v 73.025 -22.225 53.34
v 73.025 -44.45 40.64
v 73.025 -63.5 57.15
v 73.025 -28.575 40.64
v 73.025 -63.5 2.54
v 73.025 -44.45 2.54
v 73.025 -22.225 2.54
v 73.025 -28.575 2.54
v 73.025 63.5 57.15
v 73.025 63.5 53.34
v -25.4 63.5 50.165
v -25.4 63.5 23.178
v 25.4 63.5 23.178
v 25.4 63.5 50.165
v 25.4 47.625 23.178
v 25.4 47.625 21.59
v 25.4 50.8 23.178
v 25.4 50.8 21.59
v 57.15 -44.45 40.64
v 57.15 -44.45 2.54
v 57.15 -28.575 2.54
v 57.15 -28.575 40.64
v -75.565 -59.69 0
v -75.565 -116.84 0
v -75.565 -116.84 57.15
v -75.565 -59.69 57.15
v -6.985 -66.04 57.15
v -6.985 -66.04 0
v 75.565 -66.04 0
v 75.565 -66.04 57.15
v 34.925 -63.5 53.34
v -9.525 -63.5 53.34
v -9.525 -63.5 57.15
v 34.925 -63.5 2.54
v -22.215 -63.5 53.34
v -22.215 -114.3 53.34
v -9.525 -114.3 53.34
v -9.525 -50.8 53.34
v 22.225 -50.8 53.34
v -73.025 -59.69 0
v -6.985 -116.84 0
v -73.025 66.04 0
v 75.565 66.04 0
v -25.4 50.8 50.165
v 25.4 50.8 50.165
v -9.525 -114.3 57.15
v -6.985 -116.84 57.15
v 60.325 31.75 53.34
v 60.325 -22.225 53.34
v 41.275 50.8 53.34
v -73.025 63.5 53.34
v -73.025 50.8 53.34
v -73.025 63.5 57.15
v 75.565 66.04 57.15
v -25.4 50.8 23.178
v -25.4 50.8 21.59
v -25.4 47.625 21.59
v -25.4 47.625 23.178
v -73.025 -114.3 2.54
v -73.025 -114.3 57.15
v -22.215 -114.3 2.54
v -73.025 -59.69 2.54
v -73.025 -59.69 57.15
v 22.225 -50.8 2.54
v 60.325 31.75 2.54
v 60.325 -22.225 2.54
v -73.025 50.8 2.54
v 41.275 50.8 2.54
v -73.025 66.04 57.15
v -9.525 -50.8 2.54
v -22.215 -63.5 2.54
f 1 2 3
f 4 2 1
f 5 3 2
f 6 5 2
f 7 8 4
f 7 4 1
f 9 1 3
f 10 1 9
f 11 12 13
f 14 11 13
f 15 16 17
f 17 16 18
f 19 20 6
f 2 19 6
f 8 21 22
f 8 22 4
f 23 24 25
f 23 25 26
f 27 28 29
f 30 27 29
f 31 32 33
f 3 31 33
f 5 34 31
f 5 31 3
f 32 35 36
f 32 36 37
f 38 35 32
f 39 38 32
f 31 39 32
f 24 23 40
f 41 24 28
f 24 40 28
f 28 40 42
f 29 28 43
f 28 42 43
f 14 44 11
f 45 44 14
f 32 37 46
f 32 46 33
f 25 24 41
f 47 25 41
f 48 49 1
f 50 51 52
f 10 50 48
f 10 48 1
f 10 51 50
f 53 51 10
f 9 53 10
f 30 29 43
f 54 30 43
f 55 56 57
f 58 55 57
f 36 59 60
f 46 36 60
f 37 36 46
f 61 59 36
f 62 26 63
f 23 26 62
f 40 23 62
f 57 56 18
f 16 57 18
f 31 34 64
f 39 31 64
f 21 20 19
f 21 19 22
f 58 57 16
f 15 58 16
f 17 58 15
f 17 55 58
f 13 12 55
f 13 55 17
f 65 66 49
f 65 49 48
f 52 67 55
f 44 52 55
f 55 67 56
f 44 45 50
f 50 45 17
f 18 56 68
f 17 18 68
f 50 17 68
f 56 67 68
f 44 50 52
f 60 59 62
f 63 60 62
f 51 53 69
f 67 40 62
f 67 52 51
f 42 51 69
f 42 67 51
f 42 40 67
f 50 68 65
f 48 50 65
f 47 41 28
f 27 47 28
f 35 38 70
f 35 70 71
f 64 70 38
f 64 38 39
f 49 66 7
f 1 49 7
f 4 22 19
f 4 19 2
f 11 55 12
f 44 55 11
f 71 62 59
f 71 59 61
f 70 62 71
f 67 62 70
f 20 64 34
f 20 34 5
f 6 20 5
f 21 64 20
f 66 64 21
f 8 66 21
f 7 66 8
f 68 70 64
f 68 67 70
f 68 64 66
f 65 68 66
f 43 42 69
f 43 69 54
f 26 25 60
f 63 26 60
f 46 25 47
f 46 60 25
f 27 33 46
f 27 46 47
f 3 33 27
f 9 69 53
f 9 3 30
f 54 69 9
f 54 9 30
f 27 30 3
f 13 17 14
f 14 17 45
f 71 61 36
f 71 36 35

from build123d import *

# Parameters (mm, degrees)
F0_W      = 146.05
F0_H      = 127
F1_DEPTH  = 2.54
F2_W      = 146.05
F2_H      = 12.7
F3_DEPTH  = 50.8
F5_W      = 50.8
F5_H      = 28.575
F6_DEPTH  = 12.7
F7_W      = 50.8
F7_H      = 3.175
F7_H_2    = 12.7
F8_DEPTH  = 1.5875
F9_W      = 63.5
F9_H      = 50.8
F10_DEPTH = 2.54
F11_W     = 12.7
F11_H     = 73.025
F12_DEPTH = 50.8
F13_W     = 148.59
F13_H     = 2.54
F15_DEPTH = 57.15
F14_W     = 2.54
F14_H     = 127
F16_DEPTH = 57.15
F18_DEPTH = 50.8
F19_W     = 31.75
F19_H     = 12.7
F20_DEPTH = 50.8
F22_DEPTH = 50.8
F24_DEPTH = 50.8
F25_W     = 12.68959
F25_H     = 50.8
F26_DEPTH = 50.8
F4_W      = 15.875
F4_H      = 15.875
F27_DEPTH = 38.1
F28_W     = 85.09
F28_H     = 2.54
F29_DEPTH = 57.15
F30_W     = 2.54
F30_H     = 50.8
F32_DEPTH = 57.15
F31_W     = 63.5
F31_H     = 2.54
F33_DEPTH = 57.15
F34_W     = 2.54
F34_H     = 57.15
F35_DEPTH = 57.15


with BuildPart() as f1:
    # F0 (on Top) → F1 (new body)
    with BuildSketch(Plane.XY):
        Rectangle(F0_W, F0_H)
    extrude(amount=F1_DEPTH)

    # F2 (on face) → F3 (join)
    with BuildSketch(Plane.XY.offset(2.54)):
        with Locations((0, 57.15)):
            Rectangle(F2_W, F2_H)
    extrude(amount=F3_DEPTH)

    # F5 (on face) → F6 (cut)
    with BuildSketch(Plane.XZ.offset(-50.8)):
        with Locations((0, 35.8775)):
            Rectangle(F5_W, F5_H)
    extrude(amount=-F6_DEPTH, mode=Mode.SUBTRACT)

    # F7 (on face) → F8 (join)
    with BuildSketch(Plane.XY.offset(21.59)):
        with Locations((0, 49.2125)):
            Rectangle(F7_W, F7_H)
        with Locations((0, 57.15)):
            Rectangle(F7_W, F7_H_2)
    extrude(amount=F8_DEPTH)

    # F9 (on Top) → F10 (join)
    with BuildSketch(Plane.XY):
        with Locations((-41.275, -88.9)):
            Rectangle(F9_W, F9_H)
    extrude(amount=F10_DEPTH)

    # F11 (on face) → F12 (join)
    with BuildSketch(Plane.XY.offset(2.54)):
        with Locations((66.675, 14.2875)):
            Rectangle(F11_W, F11_H)
    extrude(amount=F12_DEPTH)

    # F13 (on Top) → F15 (join)
    with BuildSketch(Plane.XY):
        with Locations((1.27, 64.77)):
            Rectangle(F13_W, F13_H)
    extrude(amount=F15_DEPTH)

    # F14 (on Top) → F16 (join)
    with BuildSketch(Plane.XY):
        with Locations((74.295, 0)):
            Rectangle(F14_W, F14_H)
    extrude(amount=F16_DEPTH)

    # F17 (on face) → F18 (join)
    with BuildSketch(Plane.XY.offset(2.54)):
        Polygon((60.325, 31.75), (60.325, 50.8), (41.275, 50.8), align=None)
    extrude(amount=F18_DEPTH)

    # F19 (on face) → F20 (join)
    with BuildSketch(Plane.XY.offset(2.54)):
        with Locations((6.35, -57.15)):
            Rectangle(F19_W, F19_H)
    extrude(amount=F20_DEPTH)

    # F21 (on face) → F22 (join)
    with BuildSketch(Plane.XY.offset(2.54)):
        Polygon((34.925, -63.5), (22.225, -50.8), (22.225, -63.5), align=None)
    extrude(amount=F22_DEPTH)

    # F23 (on face) → F24 (join)
    with BuildSketch(Plane.XY.offset(2.54)):
        Polygon((-9.525, -63.5), (-9.525, -50.8), (-22.21459, -63.5), align=None)
    extrude(amount=F24_DEPTH)

    # F25 (on face) → F26 (join)
    with BuildSketch(Plane.XY.offset(2.54)):
        with Locations((-15.869795, -88.9)):
            Rectangle(F25_W, F25_H)
    extrude(amount=F26_DEPTH)

    # F4 (on face) → F27 (join)
    with BuildSketch(Plane.XY.offset(2.54)):
        with Locations((65.0875, -36.5125)):
            Rectangle(F4_W, F4_H)
    extrude(amount=F27_DEPTH)

    # F28 (on Top) → F29 (join)
    with BuildSketch(Plane.XY):
        with Locations((33.02, -64.77)):
            Rectangle(F28_W, F28_H)
    extrude(amount=F29_DEPTH)

    # F30 (on Top) → F32 (join)
    with BuildSketch(Plane.XY):
        with Locations((-8.255, -91.44)):
            Rectangle(F30_W, F30_H)
    extrude(amount=F32_DEPTH)

    # F31 (on Top) → F33 (join)
    with BuildSketch(Plane.XY):
        with Locations((-41.275, -115.57)):
            Rectangle(F31_W, F31_H)
    extrude(amount=F33_DEPTH)

    # F34 (on Top) → F35 (join)
    with BuildSketch(Plane.XY):
        with Locations((-74.295, -88.265)):
            Rectangle(F34_W, F34_H)
    extrude(amount=F35_DEPTH)


solid = f1.part
